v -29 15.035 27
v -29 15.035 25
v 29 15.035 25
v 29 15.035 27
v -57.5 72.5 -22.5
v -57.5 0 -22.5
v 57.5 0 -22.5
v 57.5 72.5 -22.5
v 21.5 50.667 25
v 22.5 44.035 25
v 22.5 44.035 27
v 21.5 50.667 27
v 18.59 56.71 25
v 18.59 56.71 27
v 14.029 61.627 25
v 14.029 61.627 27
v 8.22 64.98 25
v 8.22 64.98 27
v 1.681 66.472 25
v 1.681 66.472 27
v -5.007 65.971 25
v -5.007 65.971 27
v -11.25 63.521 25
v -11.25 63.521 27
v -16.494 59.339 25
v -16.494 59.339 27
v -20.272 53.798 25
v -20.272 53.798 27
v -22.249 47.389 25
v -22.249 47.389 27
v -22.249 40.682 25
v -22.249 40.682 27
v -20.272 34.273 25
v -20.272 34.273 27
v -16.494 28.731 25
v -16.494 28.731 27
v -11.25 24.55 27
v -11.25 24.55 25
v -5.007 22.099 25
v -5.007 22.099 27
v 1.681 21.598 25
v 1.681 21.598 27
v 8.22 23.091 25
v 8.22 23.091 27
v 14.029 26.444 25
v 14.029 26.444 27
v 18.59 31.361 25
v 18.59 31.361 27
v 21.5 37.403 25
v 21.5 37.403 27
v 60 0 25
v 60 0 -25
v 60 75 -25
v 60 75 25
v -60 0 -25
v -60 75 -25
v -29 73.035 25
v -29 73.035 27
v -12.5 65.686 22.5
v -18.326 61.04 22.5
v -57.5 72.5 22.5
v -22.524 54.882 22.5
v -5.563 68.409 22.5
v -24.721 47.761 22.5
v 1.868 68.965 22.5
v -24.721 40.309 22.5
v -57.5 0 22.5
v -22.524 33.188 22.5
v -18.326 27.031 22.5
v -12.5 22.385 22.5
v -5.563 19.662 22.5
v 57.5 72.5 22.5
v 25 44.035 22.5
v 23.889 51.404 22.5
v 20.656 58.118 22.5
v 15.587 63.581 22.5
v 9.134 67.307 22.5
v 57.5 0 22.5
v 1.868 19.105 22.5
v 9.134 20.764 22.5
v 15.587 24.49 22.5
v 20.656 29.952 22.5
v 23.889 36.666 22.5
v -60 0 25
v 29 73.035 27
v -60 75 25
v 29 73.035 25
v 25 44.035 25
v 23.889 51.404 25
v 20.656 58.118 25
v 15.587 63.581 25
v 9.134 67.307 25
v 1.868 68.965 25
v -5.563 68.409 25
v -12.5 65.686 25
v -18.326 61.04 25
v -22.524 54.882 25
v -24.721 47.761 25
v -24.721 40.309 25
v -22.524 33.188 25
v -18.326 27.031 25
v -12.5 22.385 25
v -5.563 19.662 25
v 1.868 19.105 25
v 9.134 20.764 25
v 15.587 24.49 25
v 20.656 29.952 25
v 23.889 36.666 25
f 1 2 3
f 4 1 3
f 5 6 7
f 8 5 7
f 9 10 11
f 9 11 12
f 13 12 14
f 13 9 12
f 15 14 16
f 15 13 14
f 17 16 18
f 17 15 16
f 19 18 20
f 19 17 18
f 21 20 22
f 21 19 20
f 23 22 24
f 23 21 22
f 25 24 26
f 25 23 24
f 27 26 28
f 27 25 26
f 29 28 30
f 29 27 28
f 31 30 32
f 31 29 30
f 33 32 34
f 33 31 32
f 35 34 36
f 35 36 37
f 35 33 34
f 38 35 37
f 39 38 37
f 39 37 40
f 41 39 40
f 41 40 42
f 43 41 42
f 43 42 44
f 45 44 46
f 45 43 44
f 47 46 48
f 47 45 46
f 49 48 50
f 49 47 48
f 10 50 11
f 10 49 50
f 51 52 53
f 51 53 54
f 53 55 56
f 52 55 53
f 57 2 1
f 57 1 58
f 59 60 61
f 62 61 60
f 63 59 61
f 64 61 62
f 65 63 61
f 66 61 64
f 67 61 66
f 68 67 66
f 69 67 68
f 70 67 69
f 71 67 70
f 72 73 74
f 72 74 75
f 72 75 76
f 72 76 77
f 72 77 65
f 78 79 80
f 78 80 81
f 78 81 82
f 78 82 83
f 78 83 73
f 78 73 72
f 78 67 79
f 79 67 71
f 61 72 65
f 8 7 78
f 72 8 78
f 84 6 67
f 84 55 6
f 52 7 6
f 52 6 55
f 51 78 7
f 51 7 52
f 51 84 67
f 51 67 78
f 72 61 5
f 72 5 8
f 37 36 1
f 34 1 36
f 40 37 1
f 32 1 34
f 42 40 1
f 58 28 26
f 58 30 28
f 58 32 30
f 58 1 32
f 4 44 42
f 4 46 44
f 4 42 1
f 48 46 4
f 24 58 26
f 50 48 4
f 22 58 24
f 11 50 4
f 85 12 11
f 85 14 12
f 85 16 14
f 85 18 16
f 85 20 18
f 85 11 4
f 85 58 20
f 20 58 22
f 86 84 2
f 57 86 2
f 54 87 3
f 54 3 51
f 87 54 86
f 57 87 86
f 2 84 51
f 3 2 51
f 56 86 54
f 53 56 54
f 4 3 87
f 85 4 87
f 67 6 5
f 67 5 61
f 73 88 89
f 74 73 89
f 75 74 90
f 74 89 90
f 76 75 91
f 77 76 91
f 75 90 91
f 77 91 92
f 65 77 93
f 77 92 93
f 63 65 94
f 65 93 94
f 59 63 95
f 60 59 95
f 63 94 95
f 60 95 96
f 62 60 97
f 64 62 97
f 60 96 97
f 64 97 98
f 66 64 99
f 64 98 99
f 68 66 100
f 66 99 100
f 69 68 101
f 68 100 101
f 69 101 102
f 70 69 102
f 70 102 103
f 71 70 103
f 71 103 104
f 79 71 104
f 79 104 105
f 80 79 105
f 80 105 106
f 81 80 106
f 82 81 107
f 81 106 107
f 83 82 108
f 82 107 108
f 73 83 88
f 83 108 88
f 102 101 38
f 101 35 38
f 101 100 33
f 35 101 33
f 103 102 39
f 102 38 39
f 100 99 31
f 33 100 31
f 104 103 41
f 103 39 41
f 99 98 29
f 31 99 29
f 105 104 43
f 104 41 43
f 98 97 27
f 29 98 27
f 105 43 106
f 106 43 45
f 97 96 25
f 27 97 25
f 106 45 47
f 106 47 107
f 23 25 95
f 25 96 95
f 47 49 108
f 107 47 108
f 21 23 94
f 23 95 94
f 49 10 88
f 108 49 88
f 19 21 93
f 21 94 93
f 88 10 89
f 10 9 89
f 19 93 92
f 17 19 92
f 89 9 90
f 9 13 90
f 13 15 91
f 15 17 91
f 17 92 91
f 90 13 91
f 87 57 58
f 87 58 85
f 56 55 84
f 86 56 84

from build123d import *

# Parameters (mm, degrees)
F0_W     = 120
F0_H     = 50
F1_DEPTH = 75
F2_T     = -2.5
F3_R     = 25
F4_DEPTH = 2.5
F5_W     = 58
F5_H     = 58
F5_R     = 22.5
F6_DEPTH = 2


with BuildPart() as f1:
    # F0 (on Front) → F1 (new body)
    with BuildSketch(Plane.XZ):
        Rectangle(F0_W, F0_H)
    extrude(amount=-F1_DEPTH)

    # F2
    f2_openings = [f1.faces().sort_by_distance(p)[0] for p in [
        (0, 0, 0),
    ]]
    offset(amount=F2_T, openings=f2_openings)

    # F3 (on face) → F4 (cut, through all)
    with BuildSketch(Plane.XY.offset(25)):
        with Locations((0, 44.035366)):
            Circle(F3_R)
    extrude(amount=-F4_DEPTH, mode=Mode.SUBTRACT)

    # F5 (on face) → F6 (join)
    with BuildSketch(Plane.XY.offset(25)):
        with Locations((0, 44.035366)):
            Rectangle(F5_W, F5_H)
        with Locations((0, 44.035366)):
            Circle(F5_R, mode=Mode.SUBTRACT)
    extrude(amount=F6_DEPTH)


solid = f1.part
